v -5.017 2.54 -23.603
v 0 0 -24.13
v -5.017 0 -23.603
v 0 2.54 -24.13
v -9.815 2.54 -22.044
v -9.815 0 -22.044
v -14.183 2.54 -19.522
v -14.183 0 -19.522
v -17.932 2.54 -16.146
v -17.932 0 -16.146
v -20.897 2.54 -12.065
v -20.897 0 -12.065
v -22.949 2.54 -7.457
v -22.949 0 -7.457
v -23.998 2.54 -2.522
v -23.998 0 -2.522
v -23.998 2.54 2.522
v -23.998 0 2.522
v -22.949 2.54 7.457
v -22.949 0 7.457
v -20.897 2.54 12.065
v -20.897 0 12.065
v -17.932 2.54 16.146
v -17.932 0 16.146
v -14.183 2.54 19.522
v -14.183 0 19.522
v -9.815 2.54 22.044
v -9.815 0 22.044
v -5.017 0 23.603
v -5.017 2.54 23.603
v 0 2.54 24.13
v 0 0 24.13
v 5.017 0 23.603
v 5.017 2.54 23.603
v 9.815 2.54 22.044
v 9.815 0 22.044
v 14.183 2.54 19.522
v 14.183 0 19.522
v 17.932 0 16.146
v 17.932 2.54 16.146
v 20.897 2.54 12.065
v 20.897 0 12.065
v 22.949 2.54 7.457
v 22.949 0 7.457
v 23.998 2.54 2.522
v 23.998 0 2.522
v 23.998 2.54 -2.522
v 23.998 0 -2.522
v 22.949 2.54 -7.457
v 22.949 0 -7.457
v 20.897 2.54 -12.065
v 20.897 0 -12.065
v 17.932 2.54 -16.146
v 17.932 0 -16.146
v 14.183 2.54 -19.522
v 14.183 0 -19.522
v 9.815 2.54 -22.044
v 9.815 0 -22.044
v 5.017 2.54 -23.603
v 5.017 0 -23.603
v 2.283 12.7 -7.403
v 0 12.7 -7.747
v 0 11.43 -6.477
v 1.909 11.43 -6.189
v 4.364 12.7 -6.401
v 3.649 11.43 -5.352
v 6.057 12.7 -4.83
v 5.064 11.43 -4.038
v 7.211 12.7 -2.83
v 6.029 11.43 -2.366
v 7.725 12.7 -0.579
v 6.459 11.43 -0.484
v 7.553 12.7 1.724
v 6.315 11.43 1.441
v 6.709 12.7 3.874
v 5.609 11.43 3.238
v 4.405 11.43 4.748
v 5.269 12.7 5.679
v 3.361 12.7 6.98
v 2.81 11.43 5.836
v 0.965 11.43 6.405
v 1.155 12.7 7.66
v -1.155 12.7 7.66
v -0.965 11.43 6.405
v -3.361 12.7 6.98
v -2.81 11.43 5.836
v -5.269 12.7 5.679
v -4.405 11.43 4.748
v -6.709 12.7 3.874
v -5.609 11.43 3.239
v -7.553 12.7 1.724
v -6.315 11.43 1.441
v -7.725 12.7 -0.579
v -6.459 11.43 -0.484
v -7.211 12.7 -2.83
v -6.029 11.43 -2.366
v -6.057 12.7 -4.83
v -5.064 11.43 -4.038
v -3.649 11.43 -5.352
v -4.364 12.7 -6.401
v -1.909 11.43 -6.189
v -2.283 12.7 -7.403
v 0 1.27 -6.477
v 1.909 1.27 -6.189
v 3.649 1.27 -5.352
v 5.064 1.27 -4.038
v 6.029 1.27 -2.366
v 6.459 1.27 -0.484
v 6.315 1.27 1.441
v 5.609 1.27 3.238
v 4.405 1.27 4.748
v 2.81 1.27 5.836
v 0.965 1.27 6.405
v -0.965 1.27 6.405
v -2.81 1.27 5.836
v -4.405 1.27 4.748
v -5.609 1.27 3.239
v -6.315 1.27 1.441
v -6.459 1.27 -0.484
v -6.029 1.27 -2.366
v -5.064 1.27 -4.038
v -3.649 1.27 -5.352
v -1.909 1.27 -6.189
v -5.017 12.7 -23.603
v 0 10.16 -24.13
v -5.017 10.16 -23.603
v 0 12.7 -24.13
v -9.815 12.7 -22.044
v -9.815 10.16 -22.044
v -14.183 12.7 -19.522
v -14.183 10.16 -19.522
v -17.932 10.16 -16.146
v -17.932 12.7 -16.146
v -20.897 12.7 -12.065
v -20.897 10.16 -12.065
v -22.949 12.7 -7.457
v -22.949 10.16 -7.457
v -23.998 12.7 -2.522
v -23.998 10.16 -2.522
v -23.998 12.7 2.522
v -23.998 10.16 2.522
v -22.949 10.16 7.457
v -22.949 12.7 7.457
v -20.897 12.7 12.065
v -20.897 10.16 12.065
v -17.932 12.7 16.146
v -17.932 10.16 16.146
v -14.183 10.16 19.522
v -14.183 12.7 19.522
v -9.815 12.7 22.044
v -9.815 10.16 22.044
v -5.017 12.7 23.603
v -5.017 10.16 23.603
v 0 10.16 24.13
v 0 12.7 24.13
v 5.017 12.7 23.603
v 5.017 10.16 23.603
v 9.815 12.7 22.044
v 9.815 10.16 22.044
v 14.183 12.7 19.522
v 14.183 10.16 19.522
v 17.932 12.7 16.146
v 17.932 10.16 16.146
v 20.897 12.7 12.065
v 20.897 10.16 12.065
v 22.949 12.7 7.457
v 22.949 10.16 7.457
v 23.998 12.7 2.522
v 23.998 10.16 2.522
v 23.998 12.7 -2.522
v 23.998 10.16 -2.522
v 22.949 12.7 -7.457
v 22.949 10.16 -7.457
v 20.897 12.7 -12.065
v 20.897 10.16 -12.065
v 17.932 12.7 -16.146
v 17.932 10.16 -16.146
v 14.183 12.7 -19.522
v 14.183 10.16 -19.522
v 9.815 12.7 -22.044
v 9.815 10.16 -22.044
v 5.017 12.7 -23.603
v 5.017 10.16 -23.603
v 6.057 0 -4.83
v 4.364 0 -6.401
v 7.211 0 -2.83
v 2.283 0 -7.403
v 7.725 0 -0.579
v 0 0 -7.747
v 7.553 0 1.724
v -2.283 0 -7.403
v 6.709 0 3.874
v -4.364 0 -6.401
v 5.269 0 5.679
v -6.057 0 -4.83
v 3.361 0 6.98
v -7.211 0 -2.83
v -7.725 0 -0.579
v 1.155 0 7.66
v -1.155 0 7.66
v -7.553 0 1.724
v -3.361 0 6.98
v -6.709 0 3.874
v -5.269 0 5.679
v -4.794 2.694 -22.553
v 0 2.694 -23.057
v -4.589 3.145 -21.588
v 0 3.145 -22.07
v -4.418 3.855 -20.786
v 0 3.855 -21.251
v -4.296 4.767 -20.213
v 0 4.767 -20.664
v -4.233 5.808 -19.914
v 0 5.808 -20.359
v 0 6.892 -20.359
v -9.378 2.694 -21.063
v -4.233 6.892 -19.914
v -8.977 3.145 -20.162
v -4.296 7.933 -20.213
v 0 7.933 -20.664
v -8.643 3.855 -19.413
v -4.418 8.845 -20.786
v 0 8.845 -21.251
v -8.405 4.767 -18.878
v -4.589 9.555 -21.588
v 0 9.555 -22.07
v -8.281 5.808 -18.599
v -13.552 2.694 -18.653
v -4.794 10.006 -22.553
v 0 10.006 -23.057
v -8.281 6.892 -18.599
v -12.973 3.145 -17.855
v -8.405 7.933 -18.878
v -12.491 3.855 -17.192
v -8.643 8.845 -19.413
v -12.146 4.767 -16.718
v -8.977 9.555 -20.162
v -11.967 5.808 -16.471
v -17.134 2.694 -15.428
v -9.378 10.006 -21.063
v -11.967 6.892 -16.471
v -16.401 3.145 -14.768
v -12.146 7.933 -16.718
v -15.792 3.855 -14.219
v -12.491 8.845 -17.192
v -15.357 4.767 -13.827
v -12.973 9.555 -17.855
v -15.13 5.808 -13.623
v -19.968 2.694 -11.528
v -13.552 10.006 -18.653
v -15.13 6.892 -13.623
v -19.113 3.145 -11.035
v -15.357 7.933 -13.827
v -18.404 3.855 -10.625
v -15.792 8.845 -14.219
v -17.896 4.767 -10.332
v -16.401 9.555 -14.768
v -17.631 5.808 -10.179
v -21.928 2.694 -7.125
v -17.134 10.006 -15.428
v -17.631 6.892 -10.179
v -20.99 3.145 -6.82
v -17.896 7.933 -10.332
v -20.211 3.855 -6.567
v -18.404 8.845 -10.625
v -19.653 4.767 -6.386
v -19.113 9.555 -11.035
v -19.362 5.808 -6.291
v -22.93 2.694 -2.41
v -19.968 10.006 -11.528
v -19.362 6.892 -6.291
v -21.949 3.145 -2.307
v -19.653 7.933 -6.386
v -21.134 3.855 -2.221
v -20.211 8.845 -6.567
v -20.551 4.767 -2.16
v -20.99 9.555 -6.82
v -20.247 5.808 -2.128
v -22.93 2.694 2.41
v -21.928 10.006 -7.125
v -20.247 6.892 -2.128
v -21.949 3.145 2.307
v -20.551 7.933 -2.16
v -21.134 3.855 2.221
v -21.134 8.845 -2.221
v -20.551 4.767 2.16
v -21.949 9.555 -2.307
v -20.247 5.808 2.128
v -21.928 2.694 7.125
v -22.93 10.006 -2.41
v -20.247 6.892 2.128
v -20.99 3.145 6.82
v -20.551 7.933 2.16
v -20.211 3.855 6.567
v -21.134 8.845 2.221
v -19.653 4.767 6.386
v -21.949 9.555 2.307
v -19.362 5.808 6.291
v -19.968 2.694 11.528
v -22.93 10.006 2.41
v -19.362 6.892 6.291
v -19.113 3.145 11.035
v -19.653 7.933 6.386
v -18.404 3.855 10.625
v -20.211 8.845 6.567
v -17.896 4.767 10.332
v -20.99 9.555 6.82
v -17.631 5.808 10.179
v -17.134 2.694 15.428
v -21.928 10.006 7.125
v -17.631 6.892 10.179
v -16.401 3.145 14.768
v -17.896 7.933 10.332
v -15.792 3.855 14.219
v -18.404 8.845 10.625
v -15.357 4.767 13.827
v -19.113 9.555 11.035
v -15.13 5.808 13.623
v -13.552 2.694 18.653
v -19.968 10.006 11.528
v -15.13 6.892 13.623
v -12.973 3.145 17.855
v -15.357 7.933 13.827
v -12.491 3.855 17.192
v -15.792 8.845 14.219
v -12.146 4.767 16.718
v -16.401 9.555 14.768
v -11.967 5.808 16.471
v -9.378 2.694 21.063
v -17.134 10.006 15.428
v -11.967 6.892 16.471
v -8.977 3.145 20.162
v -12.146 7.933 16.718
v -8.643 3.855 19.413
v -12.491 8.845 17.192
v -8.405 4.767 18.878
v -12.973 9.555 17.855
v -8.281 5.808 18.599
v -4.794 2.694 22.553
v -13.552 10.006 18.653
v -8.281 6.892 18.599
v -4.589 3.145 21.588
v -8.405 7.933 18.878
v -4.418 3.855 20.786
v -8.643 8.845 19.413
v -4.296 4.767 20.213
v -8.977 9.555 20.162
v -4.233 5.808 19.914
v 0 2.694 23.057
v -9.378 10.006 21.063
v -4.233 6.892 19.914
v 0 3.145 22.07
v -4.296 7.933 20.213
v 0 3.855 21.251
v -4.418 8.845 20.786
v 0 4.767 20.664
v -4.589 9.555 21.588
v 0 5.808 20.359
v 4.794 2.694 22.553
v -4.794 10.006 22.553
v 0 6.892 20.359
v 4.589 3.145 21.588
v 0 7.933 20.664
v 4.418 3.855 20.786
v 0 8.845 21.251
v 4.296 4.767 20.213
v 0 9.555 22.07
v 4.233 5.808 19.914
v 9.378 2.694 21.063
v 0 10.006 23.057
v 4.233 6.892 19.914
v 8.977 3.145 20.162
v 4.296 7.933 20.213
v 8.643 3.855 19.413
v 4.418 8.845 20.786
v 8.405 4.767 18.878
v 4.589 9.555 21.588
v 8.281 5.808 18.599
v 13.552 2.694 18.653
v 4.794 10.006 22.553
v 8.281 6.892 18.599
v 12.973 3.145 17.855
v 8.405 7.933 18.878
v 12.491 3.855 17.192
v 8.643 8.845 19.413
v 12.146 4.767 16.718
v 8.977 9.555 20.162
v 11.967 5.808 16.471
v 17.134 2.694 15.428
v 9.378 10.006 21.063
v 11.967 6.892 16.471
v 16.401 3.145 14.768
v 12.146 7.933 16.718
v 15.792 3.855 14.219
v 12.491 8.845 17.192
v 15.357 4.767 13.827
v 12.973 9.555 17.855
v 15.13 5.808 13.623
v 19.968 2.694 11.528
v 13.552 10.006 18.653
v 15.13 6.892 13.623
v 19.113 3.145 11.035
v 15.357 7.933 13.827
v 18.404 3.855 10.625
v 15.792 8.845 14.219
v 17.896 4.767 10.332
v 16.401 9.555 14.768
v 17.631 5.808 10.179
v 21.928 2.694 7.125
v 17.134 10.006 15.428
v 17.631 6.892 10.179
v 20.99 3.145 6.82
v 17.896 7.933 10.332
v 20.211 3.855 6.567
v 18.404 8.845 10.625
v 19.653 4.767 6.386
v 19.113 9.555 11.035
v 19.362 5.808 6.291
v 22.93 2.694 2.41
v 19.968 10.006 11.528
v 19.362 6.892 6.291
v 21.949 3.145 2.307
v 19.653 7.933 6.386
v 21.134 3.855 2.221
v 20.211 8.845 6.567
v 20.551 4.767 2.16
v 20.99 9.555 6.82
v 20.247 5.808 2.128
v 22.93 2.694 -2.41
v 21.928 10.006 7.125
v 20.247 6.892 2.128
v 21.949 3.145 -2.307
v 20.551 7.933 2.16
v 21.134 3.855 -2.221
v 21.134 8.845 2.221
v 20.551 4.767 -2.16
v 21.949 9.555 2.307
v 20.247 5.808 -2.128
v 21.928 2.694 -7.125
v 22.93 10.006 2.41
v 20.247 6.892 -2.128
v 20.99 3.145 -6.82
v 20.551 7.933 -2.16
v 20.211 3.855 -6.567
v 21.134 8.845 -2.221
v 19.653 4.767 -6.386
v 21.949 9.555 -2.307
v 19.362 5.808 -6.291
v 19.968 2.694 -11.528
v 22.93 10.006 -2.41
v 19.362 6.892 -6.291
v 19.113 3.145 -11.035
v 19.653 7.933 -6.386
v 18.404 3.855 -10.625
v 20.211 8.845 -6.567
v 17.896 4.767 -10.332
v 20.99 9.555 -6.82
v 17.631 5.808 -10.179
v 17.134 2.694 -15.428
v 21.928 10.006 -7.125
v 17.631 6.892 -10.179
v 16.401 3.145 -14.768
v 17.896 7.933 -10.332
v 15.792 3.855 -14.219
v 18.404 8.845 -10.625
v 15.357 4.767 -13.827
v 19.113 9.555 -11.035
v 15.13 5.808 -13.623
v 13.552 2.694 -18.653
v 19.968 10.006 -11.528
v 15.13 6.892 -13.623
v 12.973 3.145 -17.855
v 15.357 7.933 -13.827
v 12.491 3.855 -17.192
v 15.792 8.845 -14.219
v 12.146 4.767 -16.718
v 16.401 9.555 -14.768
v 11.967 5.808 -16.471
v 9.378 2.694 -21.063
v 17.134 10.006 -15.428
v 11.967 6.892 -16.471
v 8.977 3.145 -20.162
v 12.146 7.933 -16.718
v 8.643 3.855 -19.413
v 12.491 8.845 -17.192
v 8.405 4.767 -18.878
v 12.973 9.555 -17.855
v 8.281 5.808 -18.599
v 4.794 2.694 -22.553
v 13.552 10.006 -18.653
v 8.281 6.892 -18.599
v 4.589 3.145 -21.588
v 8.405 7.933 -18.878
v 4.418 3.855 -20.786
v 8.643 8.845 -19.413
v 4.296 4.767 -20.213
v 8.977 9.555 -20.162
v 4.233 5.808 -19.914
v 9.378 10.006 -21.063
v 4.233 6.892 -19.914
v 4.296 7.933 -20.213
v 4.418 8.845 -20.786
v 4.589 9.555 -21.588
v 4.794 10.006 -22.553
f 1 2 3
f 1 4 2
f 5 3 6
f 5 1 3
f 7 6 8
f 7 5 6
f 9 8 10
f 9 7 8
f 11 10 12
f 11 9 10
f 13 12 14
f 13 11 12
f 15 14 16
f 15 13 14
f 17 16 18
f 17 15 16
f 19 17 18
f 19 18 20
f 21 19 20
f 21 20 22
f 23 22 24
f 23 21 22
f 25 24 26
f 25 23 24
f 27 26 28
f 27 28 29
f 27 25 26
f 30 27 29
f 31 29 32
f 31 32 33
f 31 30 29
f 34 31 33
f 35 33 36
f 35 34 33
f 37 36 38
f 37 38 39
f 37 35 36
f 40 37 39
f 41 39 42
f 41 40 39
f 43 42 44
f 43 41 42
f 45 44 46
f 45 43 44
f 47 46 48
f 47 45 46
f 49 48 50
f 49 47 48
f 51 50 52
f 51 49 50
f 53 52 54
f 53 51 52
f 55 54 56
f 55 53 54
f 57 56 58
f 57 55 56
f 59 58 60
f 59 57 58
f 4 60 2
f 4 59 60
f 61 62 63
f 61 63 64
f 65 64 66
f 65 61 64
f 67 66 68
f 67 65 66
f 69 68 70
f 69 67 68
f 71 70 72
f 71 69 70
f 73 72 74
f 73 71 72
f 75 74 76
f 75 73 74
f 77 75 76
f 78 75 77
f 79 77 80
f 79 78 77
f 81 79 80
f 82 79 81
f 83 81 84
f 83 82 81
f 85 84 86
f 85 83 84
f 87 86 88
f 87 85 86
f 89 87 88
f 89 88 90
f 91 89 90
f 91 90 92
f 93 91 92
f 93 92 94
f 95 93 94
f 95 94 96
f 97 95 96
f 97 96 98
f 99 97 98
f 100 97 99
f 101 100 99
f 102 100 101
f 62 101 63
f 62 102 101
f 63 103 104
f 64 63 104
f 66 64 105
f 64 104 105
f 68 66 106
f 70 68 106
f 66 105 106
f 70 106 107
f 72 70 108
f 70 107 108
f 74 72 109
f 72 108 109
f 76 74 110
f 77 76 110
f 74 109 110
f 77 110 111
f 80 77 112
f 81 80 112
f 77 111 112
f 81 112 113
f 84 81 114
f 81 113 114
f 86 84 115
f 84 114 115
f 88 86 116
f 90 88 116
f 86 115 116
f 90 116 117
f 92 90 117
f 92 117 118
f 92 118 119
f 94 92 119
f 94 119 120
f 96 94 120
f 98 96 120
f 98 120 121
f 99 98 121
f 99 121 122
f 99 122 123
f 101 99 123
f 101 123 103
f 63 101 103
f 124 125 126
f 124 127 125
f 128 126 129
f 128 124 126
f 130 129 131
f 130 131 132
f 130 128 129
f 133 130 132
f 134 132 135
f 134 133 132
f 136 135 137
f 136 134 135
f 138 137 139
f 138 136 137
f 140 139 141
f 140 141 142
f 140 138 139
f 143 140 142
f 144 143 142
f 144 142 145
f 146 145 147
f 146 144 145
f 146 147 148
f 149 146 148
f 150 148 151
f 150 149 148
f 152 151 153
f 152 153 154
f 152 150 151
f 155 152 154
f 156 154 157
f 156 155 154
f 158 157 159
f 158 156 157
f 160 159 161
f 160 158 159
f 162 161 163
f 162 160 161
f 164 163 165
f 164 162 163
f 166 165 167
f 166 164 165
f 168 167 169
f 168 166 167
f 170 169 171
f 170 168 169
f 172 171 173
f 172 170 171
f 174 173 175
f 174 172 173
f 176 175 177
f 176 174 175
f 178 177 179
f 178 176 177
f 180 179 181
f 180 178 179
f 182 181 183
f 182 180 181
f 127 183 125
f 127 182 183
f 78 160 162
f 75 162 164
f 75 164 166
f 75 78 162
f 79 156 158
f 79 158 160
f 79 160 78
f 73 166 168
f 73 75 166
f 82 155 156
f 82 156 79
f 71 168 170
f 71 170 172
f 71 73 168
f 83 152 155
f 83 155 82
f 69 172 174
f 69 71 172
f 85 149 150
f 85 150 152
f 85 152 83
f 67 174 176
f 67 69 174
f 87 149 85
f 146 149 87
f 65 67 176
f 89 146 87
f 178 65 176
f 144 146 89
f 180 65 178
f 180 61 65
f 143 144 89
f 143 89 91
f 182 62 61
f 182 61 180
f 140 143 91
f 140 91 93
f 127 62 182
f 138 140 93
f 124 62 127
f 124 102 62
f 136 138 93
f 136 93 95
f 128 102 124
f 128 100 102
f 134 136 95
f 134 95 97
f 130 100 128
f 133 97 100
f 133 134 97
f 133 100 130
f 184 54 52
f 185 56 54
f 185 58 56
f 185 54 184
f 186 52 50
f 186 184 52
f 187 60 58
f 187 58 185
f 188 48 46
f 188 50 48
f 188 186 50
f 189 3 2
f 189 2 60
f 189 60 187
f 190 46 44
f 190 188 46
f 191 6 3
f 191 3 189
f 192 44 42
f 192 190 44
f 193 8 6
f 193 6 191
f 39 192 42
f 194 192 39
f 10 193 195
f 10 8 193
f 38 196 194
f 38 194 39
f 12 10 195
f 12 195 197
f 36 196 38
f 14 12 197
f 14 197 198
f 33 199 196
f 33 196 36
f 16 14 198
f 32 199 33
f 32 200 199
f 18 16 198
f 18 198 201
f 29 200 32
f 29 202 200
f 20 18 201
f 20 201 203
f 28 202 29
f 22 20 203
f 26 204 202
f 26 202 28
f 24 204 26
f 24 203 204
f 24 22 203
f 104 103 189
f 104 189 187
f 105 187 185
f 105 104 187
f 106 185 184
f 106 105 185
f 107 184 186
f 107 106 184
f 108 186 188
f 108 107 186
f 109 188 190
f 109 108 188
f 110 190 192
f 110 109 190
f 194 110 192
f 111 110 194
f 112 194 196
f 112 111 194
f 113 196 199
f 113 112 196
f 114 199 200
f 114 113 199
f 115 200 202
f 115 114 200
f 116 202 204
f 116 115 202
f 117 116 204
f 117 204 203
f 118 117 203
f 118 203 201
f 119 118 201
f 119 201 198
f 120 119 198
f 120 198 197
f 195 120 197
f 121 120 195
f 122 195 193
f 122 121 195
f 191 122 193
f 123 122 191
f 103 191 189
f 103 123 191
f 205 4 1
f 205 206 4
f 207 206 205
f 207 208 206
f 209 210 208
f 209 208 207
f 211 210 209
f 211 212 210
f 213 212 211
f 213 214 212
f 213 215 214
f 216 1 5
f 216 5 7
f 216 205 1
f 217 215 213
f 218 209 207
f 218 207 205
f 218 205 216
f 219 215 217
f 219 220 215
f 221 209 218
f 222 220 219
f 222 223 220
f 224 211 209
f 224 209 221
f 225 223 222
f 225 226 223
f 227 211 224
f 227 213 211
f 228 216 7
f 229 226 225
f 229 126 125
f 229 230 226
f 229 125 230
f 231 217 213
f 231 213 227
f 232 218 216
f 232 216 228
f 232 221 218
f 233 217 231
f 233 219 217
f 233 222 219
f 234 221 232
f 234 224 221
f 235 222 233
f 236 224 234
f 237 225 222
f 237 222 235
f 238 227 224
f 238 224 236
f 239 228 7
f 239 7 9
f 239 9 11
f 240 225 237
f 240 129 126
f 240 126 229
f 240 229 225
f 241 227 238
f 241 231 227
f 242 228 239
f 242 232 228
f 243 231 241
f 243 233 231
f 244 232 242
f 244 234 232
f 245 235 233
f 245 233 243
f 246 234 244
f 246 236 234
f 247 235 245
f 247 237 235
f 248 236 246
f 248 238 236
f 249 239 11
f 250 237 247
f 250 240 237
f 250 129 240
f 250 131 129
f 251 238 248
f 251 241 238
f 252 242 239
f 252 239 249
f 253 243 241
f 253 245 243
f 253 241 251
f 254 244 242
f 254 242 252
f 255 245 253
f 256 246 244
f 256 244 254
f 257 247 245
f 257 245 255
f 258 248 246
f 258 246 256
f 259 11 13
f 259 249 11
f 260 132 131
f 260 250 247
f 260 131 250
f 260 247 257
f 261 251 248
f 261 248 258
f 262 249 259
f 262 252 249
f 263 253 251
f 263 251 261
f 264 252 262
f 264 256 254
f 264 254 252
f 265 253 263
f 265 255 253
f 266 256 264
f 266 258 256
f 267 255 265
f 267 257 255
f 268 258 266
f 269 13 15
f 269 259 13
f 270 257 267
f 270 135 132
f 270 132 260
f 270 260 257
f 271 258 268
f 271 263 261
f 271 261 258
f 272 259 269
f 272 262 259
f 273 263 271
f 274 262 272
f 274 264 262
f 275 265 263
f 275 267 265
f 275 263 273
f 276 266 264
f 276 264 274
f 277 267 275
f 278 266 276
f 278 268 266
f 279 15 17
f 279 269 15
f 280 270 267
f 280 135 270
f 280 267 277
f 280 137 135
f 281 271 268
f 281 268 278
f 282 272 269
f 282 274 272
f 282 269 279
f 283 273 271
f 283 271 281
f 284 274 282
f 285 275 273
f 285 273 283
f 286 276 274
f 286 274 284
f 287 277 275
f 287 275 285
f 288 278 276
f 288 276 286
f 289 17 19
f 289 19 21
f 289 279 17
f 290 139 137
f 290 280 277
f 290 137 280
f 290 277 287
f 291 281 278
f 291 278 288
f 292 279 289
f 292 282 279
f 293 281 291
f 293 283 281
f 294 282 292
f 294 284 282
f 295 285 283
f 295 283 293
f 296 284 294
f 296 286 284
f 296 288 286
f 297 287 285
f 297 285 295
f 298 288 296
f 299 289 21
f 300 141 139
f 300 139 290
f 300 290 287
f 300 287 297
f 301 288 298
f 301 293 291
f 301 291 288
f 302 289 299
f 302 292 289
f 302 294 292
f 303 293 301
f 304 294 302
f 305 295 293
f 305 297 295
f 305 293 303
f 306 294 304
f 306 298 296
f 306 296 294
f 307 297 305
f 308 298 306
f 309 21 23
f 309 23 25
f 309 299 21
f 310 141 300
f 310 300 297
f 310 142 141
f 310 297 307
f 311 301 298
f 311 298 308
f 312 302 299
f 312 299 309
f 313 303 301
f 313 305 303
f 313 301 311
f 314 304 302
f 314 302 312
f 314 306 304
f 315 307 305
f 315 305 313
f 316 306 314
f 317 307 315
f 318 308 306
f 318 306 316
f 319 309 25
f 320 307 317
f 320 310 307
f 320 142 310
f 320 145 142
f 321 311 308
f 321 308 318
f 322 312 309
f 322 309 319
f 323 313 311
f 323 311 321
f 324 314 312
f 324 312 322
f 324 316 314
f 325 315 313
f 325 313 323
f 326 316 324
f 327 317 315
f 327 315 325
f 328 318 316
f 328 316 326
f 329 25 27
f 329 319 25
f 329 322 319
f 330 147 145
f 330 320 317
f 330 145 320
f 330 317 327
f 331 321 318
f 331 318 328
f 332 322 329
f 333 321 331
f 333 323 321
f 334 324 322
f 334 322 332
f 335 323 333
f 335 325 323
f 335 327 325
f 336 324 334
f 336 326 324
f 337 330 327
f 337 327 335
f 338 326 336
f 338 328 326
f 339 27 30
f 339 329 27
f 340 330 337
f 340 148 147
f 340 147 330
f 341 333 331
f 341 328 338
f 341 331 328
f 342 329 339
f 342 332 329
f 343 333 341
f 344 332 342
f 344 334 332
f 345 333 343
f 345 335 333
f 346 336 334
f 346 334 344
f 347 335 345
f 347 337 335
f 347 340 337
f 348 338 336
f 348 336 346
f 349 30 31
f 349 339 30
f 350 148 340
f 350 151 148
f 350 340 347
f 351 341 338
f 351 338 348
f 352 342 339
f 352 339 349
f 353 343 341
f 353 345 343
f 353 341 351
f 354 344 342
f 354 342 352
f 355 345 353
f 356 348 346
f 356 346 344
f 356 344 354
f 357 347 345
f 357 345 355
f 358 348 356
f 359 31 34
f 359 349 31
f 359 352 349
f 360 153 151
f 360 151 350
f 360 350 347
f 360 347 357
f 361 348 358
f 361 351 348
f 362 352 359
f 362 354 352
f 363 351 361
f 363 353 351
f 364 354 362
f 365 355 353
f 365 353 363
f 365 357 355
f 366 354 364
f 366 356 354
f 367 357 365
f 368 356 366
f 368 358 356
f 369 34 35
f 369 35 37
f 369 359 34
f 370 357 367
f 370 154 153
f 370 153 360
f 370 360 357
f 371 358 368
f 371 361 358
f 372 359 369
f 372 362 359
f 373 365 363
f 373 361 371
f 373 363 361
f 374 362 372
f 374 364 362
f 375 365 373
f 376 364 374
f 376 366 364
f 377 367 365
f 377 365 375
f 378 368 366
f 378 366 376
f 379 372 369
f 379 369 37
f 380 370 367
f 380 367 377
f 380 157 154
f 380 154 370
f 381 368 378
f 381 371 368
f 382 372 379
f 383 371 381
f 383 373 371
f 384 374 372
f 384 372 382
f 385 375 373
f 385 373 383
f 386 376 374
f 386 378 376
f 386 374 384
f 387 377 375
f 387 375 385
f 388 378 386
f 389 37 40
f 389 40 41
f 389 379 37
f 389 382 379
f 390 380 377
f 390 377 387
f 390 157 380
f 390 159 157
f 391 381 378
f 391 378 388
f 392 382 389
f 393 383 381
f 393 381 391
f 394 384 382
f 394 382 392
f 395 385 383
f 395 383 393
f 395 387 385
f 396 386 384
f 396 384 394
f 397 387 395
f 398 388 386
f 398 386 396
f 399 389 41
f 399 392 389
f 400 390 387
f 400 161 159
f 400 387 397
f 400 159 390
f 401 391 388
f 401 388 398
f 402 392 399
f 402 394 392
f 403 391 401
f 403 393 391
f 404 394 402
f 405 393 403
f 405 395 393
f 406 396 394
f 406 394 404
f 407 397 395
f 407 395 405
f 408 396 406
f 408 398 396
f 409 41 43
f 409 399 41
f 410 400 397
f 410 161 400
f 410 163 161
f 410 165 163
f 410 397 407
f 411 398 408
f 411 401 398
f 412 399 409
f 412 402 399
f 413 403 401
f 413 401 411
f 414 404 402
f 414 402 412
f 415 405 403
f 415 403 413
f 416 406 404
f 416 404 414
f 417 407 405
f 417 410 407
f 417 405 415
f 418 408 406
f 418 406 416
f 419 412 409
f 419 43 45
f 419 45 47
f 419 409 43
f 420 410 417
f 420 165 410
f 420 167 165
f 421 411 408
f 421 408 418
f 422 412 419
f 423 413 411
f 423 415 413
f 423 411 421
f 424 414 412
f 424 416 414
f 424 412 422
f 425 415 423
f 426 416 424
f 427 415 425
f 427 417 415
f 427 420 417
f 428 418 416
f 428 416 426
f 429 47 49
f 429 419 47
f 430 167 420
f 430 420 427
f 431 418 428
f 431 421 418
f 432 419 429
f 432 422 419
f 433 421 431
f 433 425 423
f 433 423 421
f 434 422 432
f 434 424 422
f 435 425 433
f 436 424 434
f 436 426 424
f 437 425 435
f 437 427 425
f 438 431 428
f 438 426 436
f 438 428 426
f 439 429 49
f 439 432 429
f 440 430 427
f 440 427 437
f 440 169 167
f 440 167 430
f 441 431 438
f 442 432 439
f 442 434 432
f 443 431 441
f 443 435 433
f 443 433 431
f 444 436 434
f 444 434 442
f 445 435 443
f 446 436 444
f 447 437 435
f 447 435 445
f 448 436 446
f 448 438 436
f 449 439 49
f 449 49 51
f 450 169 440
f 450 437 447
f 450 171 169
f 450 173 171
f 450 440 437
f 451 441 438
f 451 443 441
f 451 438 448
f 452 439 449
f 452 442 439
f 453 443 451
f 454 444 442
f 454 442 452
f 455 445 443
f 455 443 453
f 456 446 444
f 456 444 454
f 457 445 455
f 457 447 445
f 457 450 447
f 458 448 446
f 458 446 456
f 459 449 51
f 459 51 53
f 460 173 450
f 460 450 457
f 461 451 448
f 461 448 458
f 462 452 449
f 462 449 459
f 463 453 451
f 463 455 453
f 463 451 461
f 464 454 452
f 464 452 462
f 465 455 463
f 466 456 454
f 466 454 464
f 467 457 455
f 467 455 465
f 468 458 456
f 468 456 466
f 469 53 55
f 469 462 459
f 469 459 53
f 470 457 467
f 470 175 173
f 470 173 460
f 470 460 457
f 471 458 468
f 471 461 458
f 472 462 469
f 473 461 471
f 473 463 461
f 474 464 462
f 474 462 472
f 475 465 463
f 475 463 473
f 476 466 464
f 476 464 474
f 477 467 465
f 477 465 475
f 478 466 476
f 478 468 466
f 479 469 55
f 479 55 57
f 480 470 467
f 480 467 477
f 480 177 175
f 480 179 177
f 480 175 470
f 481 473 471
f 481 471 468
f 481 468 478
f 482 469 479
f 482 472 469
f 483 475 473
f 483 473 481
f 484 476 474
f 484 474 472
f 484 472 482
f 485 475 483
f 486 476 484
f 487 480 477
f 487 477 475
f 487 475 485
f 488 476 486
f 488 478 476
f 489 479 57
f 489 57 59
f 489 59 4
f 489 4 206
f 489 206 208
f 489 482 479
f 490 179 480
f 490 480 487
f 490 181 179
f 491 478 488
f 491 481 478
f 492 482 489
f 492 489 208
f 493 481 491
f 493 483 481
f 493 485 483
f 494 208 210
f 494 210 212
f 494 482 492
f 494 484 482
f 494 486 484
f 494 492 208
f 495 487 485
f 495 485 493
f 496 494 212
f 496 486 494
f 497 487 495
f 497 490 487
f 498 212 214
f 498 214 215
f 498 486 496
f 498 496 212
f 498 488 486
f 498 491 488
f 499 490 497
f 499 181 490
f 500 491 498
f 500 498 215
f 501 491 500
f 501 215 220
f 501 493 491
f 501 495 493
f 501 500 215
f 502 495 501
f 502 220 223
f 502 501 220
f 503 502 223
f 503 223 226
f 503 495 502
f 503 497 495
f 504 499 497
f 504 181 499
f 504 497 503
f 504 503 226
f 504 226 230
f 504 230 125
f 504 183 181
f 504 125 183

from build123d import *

# Parameters (mm, degrees)
SKETCH2_R          = 6.477
CUT_EXTRUDE1_DEPTH = 37.411588815
CHAMFER1_SIZE      = 1.27


with BuildPart() as part:
    # Sketch1 → Revolve1 (revolve)
    with BuildSketch(Plane(origin=(0, 0, 0), x_dir=(0, 0, -1), z_dir=(1, 0, 0))):
        with BuildLine():
            Line((0, 0), (24.13, 0))
            Line((24.13, 0), (24.13, 2.54))
            ThreePointArc((24.13, 2.54), (20.32, 6.35), (24.13, 10.16))
            Line((24.13, 10.16), (24.13, 12.7))
            Line((24.13, 12.7), (0, 12.7))
            Line((0, 12.7), (0, 0))
        make_face()
    revolve(axis=Axis((0, 0, 0), (0, 1, 0)))

    # Sketch2 → Cut-Extrude1 (cut, through all)
    with BuildSketch(Plane.XZ):
        with Locations(Location((0, 0, 0), (0, 0, 270))):
            Circle(SKETCH2_R)
    extrude(amount=-CUT_EXTRUDE1_DEPTH, mode=Mode.SUBTRACT)

    # Chamfer1
    chamfer1_edges = [part.edges().sort_by_distance(p)[0] for p in [
        (0, 12.7, 6.477),
        (0, 0, 6.477),
    ]]
    chamfer(chamfer1_edges, length=CHAMFER1_SIZE)


solid = part.part
